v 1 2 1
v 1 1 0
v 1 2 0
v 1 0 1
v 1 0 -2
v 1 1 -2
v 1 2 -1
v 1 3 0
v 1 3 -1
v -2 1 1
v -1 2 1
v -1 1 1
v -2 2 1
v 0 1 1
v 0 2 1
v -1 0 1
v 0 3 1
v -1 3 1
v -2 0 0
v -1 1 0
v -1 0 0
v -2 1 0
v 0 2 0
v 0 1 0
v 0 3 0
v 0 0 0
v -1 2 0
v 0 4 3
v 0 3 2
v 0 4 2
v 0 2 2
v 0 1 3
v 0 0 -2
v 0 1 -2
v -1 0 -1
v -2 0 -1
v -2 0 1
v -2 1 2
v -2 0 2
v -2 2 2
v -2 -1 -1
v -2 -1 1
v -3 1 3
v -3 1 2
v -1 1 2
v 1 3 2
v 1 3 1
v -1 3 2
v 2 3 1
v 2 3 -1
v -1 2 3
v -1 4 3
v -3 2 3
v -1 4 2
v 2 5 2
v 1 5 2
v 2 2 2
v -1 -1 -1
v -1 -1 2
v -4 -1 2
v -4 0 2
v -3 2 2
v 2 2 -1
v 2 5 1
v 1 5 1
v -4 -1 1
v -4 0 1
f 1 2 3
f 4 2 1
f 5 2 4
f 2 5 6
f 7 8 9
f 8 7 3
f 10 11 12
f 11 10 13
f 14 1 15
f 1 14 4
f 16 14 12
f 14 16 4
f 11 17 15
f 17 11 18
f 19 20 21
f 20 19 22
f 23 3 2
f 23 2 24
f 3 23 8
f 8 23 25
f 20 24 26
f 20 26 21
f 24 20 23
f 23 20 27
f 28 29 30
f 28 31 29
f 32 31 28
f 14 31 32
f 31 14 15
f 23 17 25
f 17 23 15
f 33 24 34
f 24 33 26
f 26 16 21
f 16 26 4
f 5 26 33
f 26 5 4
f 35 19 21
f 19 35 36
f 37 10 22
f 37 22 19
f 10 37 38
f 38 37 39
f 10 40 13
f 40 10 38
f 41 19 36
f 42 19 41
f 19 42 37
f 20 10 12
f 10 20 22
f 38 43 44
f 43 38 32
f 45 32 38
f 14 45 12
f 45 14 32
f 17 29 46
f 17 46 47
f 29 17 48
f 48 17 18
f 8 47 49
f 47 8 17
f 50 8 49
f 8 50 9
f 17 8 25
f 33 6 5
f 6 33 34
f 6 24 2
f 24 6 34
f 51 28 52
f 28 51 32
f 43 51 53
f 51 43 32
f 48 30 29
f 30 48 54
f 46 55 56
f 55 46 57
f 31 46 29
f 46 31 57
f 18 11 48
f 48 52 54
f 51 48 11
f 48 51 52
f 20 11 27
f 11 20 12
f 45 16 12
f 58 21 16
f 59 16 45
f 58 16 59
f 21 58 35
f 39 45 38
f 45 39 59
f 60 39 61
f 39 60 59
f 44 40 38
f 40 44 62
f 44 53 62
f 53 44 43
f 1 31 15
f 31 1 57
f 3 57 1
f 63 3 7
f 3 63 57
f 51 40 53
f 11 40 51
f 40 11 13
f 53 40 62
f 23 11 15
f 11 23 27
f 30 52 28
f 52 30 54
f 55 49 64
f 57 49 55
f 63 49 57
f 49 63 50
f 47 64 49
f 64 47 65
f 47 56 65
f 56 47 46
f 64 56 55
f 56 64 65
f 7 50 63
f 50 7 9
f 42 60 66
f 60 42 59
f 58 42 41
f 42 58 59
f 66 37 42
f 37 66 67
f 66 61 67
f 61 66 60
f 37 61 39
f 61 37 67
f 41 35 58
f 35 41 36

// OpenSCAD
/**
Model coded by @ken4rab
With licence cc-by-sa 4.0

https://creativecommons.org/licenses/by-sa/4.0/
*/
module module_cube_4(translation= [0,0,0]){
    translate(translation)union() {
cube(1,1,1);    
translate([-1,0,0])cube(size = [1,1,1]);
translate([0,1,0])cube(size = [1,1,1]);
translate([0,0,-1])cube(size = [1,1,1]);
    }
};
module module_cube_7(translation= [0,0,0]){
    translate(translation)union() {
cube(1,1,1);    
translate([-2,0,0])cube(size = [2,1,1]);
translate([0,1,0])cube(size = [1,2,1]);
translate([0,0,-2])cube(size = [1,1,2]);
    }
};

module_cube_7([0,0,0]);
module_cube_7([-1,1,2]);
module_cube_7([1,2,1]);
module_cube_7([-2,-1,1]);
